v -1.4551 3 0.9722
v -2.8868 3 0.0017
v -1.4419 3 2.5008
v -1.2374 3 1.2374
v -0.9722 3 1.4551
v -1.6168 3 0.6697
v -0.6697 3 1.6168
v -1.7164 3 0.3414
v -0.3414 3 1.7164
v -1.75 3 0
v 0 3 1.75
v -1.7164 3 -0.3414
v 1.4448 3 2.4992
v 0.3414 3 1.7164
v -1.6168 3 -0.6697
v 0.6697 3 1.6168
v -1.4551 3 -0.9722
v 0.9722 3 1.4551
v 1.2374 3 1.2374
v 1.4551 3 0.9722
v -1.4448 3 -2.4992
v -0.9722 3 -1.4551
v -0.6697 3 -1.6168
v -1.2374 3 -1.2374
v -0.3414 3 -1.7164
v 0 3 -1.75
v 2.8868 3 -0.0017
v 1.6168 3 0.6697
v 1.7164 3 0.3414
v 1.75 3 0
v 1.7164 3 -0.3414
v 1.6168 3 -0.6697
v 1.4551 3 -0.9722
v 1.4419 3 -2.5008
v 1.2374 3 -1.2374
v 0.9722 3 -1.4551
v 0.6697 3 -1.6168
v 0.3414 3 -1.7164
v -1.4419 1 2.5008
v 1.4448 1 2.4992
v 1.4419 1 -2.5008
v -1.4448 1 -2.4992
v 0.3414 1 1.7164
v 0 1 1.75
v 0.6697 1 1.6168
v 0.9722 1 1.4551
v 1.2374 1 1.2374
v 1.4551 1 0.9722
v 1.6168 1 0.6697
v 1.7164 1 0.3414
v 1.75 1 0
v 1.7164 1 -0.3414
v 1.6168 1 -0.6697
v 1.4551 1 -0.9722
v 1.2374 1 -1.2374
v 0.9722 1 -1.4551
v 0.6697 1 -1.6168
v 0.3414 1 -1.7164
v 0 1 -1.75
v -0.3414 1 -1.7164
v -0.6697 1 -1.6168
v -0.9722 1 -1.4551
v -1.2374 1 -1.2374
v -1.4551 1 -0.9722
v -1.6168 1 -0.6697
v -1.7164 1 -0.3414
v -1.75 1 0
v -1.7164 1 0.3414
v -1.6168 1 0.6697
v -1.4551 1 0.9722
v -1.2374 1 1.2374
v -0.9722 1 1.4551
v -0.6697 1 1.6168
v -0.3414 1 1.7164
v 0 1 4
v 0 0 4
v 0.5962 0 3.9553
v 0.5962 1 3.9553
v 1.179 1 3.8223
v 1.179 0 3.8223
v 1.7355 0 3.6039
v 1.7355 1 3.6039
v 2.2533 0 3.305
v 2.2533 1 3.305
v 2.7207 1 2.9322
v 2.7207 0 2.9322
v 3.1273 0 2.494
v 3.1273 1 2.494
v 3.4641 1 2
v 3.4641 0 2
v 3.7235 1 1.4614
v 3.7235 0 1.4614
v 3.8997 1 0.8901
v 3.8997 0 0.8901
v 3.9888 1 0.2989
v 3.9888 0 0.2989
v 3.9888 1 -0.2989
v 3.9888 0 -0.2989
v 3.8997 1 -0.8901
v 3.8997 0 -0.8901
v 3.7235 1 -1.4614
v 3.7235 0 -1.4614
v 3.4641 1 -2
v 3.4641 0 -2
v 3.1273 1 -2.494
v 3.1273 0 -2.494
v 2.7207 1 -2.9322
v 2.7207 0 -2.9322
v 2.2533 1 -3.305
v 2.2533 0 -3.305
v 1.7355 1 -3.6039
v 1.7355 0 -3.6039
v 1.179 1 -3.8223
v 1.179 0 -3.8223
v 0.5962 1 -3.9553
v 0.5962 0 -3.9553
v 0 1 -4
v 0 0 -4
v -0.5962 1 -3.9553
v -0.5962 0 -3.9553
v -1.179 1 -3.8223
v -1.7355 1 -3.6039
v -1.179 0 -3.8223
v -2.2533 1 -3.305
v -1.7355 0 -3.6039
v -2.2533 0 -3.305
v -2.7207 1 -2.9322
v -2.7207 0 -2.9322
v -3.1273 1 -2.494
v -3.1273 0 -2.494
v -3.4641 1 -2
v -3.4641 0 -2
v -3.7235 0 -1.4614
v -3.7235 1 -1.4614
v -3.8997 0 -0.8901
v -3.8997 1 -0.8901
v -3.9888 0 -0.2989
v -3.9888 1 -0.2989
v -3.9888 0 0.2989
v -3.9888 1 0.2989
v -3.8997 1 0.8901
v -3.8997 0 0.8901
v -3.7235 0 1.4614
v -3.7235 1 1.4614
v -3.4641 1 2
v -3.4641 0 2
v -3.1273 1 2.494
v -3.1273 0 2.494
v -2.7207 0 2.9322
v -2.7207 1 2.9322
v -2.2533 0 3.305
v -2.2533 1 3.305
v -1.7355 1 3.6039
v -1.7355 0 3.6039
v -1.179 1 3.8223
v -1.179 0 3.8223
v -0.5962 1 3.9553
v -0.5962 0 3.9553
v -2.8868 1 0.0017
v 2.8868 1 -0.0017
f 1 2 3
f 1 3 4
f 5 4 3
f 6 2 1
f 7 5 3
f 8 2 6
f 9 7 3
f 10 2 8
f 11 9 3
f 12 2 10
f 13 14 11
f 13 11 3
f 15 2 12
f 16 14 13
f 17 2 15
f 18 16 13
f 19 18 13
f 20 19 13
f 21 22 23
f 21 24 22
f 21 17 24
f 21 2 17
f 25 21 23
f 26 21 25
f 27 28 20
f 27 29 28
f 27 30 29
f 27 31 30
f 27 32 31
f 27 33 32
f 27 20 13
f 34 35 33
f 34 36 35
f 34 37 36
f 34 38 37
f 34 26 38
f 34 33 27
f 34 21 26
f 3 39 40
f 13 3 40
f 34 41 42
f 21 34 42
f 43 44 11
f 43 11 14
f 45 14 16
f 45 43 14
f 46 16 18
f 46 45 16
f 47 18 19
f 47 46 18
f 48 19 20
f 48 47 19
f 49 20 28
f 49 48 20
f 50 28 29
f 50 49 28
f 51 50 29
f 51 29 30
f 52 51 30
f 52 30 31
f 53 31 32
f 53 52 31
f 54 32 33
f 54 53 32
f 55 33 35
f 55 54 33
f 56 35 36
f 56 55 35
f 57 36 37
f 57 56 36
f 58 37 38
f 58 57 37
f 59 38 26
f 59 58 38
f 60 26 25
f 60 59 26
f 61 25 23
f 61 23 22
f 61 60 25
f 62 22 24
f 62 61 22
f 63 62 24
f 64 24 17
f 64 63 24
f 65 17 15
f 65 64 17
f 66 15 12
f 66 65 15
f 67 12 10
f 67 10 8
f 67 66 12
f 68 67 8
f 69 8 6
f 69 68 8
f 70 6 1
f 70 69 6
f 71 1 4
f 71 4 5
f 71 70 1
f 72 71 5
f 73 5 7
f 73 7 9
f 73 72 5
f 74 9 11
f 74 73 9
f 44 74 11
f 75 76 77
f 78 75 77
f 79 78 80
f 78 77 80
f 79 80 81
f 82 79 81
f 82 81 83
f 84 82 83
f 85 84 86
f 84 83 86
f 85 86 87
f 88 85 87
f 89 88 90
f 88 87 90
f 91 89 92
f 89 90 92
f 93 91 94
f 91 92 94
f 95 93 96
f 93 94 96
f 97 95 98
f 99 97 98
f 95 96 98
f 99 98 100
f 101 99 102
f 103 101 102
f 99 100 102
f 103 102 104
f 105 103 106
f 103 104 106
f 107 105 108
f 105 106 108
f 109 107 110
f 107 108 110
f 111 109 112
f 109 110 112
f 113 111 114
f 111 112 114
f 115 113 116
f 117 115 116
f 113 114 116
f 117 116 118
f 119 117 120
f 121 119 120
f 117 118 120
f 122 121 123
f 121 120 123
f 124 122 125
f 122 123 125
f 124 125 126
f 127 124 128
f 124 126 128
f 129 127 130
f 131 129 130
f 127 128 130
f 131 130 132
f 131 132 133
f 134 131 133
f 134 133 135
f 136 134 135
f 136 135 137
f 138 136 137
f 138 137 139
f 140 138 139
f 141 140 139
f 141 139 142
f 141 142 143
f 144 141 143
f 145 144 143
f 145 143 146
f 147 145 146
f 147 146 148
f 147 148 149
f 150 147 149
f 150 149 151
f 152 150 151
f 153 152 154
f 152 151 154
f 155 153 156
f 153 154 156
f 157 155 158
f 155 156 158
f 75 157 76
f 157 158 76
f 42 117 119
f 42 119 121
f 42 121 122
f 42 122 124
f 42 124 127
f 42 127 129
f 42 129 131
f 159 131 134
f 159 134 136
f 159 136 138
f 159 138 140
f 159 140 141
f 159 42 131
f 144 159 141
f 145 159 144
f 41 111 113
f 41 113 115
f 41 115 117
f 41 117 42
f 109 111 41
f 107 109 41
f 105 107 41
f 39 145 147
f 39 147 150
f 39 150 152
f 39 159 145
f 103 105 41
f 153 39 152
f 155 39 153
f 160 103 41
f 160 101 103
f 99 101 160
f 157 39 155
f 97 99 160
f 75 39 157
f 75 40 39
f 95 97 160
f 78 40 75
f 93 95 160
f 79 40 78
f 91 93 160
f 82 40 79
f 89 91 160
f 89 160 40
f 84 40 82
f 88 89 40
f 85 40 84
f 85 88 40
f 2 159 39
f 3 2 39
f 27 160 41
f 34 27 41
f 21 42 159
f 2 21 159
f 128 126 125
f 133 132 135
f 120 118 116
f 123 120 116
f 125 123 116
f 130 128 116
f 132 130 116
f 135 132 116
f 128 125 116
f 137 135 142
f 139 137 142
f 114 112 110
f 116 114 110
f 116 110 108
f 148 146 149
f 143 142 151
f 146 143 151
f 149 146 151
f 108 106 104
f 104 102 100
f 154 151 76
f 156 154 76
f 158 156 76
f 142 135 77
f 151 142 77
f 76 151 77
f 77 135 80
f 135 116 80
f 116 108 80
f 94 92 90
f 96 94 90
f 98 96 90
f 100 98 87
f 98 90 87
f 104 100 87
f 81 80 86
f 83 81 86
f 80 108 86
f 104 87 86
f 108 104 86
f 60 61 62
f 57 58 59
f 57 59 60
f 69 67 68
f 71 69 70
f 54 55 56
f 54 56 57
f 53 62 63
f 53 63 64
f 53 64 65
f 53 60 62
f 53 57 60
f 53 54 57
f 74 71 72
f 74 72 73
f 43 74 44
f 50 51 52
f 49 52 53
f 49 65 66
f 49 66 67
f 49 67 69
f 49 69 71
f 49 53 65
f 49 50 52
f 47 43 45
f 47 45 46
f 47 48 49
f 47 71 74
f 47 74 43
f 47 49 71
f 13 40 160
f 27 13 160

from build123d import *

# Parameters (mm, degrees)
CROQUIS1_R              = 4
SALIENTE_EXTRUIR2_DEPTH = 1
CROQUIS2_R              = 1.75
SALIENTE_EXTRUIR3_DEPTH = 2


with BuildPart() as part:
    # Croquis1 → Saliente-Extruir2 (new body)
    with BuildSketch(Plane(origin=(0, 0, 0), x_dir=(1, 0, 0), z_dir=(0, 1, 0))):
        with Locations(Location((0, 0, 0), (0, 0, 270))):
            Circle(CROQUIS1_R)
    extrude(amount=SALIENTE_EXTRUIR2_DEPTH)

    # Croquis2 → Saliente-Extruir3 (add)
    with BuildSketch(Plane(origin=(0, 1, 0), x_dir=(1, 0, 0), z_dir=(0, 1, 0))):
        Polygon((1.44192427, 2.500837406), (-1.444826589, 2.499161751), (-2.88675086, -0.001675655), (-1.44192427, -2.500837406), (1.444826589, -2.499161751), (2.88675086, 0.001675655), align=None)
        with Locations(Location((0, 0, 0), (0, 0, 270))):
            Circle(CROQUIS2_R, mode=Mode.SUBTRACT)
    extrude(amount=SALIENTE_EXTRUIR3_DEPTH)


solid = part.part
